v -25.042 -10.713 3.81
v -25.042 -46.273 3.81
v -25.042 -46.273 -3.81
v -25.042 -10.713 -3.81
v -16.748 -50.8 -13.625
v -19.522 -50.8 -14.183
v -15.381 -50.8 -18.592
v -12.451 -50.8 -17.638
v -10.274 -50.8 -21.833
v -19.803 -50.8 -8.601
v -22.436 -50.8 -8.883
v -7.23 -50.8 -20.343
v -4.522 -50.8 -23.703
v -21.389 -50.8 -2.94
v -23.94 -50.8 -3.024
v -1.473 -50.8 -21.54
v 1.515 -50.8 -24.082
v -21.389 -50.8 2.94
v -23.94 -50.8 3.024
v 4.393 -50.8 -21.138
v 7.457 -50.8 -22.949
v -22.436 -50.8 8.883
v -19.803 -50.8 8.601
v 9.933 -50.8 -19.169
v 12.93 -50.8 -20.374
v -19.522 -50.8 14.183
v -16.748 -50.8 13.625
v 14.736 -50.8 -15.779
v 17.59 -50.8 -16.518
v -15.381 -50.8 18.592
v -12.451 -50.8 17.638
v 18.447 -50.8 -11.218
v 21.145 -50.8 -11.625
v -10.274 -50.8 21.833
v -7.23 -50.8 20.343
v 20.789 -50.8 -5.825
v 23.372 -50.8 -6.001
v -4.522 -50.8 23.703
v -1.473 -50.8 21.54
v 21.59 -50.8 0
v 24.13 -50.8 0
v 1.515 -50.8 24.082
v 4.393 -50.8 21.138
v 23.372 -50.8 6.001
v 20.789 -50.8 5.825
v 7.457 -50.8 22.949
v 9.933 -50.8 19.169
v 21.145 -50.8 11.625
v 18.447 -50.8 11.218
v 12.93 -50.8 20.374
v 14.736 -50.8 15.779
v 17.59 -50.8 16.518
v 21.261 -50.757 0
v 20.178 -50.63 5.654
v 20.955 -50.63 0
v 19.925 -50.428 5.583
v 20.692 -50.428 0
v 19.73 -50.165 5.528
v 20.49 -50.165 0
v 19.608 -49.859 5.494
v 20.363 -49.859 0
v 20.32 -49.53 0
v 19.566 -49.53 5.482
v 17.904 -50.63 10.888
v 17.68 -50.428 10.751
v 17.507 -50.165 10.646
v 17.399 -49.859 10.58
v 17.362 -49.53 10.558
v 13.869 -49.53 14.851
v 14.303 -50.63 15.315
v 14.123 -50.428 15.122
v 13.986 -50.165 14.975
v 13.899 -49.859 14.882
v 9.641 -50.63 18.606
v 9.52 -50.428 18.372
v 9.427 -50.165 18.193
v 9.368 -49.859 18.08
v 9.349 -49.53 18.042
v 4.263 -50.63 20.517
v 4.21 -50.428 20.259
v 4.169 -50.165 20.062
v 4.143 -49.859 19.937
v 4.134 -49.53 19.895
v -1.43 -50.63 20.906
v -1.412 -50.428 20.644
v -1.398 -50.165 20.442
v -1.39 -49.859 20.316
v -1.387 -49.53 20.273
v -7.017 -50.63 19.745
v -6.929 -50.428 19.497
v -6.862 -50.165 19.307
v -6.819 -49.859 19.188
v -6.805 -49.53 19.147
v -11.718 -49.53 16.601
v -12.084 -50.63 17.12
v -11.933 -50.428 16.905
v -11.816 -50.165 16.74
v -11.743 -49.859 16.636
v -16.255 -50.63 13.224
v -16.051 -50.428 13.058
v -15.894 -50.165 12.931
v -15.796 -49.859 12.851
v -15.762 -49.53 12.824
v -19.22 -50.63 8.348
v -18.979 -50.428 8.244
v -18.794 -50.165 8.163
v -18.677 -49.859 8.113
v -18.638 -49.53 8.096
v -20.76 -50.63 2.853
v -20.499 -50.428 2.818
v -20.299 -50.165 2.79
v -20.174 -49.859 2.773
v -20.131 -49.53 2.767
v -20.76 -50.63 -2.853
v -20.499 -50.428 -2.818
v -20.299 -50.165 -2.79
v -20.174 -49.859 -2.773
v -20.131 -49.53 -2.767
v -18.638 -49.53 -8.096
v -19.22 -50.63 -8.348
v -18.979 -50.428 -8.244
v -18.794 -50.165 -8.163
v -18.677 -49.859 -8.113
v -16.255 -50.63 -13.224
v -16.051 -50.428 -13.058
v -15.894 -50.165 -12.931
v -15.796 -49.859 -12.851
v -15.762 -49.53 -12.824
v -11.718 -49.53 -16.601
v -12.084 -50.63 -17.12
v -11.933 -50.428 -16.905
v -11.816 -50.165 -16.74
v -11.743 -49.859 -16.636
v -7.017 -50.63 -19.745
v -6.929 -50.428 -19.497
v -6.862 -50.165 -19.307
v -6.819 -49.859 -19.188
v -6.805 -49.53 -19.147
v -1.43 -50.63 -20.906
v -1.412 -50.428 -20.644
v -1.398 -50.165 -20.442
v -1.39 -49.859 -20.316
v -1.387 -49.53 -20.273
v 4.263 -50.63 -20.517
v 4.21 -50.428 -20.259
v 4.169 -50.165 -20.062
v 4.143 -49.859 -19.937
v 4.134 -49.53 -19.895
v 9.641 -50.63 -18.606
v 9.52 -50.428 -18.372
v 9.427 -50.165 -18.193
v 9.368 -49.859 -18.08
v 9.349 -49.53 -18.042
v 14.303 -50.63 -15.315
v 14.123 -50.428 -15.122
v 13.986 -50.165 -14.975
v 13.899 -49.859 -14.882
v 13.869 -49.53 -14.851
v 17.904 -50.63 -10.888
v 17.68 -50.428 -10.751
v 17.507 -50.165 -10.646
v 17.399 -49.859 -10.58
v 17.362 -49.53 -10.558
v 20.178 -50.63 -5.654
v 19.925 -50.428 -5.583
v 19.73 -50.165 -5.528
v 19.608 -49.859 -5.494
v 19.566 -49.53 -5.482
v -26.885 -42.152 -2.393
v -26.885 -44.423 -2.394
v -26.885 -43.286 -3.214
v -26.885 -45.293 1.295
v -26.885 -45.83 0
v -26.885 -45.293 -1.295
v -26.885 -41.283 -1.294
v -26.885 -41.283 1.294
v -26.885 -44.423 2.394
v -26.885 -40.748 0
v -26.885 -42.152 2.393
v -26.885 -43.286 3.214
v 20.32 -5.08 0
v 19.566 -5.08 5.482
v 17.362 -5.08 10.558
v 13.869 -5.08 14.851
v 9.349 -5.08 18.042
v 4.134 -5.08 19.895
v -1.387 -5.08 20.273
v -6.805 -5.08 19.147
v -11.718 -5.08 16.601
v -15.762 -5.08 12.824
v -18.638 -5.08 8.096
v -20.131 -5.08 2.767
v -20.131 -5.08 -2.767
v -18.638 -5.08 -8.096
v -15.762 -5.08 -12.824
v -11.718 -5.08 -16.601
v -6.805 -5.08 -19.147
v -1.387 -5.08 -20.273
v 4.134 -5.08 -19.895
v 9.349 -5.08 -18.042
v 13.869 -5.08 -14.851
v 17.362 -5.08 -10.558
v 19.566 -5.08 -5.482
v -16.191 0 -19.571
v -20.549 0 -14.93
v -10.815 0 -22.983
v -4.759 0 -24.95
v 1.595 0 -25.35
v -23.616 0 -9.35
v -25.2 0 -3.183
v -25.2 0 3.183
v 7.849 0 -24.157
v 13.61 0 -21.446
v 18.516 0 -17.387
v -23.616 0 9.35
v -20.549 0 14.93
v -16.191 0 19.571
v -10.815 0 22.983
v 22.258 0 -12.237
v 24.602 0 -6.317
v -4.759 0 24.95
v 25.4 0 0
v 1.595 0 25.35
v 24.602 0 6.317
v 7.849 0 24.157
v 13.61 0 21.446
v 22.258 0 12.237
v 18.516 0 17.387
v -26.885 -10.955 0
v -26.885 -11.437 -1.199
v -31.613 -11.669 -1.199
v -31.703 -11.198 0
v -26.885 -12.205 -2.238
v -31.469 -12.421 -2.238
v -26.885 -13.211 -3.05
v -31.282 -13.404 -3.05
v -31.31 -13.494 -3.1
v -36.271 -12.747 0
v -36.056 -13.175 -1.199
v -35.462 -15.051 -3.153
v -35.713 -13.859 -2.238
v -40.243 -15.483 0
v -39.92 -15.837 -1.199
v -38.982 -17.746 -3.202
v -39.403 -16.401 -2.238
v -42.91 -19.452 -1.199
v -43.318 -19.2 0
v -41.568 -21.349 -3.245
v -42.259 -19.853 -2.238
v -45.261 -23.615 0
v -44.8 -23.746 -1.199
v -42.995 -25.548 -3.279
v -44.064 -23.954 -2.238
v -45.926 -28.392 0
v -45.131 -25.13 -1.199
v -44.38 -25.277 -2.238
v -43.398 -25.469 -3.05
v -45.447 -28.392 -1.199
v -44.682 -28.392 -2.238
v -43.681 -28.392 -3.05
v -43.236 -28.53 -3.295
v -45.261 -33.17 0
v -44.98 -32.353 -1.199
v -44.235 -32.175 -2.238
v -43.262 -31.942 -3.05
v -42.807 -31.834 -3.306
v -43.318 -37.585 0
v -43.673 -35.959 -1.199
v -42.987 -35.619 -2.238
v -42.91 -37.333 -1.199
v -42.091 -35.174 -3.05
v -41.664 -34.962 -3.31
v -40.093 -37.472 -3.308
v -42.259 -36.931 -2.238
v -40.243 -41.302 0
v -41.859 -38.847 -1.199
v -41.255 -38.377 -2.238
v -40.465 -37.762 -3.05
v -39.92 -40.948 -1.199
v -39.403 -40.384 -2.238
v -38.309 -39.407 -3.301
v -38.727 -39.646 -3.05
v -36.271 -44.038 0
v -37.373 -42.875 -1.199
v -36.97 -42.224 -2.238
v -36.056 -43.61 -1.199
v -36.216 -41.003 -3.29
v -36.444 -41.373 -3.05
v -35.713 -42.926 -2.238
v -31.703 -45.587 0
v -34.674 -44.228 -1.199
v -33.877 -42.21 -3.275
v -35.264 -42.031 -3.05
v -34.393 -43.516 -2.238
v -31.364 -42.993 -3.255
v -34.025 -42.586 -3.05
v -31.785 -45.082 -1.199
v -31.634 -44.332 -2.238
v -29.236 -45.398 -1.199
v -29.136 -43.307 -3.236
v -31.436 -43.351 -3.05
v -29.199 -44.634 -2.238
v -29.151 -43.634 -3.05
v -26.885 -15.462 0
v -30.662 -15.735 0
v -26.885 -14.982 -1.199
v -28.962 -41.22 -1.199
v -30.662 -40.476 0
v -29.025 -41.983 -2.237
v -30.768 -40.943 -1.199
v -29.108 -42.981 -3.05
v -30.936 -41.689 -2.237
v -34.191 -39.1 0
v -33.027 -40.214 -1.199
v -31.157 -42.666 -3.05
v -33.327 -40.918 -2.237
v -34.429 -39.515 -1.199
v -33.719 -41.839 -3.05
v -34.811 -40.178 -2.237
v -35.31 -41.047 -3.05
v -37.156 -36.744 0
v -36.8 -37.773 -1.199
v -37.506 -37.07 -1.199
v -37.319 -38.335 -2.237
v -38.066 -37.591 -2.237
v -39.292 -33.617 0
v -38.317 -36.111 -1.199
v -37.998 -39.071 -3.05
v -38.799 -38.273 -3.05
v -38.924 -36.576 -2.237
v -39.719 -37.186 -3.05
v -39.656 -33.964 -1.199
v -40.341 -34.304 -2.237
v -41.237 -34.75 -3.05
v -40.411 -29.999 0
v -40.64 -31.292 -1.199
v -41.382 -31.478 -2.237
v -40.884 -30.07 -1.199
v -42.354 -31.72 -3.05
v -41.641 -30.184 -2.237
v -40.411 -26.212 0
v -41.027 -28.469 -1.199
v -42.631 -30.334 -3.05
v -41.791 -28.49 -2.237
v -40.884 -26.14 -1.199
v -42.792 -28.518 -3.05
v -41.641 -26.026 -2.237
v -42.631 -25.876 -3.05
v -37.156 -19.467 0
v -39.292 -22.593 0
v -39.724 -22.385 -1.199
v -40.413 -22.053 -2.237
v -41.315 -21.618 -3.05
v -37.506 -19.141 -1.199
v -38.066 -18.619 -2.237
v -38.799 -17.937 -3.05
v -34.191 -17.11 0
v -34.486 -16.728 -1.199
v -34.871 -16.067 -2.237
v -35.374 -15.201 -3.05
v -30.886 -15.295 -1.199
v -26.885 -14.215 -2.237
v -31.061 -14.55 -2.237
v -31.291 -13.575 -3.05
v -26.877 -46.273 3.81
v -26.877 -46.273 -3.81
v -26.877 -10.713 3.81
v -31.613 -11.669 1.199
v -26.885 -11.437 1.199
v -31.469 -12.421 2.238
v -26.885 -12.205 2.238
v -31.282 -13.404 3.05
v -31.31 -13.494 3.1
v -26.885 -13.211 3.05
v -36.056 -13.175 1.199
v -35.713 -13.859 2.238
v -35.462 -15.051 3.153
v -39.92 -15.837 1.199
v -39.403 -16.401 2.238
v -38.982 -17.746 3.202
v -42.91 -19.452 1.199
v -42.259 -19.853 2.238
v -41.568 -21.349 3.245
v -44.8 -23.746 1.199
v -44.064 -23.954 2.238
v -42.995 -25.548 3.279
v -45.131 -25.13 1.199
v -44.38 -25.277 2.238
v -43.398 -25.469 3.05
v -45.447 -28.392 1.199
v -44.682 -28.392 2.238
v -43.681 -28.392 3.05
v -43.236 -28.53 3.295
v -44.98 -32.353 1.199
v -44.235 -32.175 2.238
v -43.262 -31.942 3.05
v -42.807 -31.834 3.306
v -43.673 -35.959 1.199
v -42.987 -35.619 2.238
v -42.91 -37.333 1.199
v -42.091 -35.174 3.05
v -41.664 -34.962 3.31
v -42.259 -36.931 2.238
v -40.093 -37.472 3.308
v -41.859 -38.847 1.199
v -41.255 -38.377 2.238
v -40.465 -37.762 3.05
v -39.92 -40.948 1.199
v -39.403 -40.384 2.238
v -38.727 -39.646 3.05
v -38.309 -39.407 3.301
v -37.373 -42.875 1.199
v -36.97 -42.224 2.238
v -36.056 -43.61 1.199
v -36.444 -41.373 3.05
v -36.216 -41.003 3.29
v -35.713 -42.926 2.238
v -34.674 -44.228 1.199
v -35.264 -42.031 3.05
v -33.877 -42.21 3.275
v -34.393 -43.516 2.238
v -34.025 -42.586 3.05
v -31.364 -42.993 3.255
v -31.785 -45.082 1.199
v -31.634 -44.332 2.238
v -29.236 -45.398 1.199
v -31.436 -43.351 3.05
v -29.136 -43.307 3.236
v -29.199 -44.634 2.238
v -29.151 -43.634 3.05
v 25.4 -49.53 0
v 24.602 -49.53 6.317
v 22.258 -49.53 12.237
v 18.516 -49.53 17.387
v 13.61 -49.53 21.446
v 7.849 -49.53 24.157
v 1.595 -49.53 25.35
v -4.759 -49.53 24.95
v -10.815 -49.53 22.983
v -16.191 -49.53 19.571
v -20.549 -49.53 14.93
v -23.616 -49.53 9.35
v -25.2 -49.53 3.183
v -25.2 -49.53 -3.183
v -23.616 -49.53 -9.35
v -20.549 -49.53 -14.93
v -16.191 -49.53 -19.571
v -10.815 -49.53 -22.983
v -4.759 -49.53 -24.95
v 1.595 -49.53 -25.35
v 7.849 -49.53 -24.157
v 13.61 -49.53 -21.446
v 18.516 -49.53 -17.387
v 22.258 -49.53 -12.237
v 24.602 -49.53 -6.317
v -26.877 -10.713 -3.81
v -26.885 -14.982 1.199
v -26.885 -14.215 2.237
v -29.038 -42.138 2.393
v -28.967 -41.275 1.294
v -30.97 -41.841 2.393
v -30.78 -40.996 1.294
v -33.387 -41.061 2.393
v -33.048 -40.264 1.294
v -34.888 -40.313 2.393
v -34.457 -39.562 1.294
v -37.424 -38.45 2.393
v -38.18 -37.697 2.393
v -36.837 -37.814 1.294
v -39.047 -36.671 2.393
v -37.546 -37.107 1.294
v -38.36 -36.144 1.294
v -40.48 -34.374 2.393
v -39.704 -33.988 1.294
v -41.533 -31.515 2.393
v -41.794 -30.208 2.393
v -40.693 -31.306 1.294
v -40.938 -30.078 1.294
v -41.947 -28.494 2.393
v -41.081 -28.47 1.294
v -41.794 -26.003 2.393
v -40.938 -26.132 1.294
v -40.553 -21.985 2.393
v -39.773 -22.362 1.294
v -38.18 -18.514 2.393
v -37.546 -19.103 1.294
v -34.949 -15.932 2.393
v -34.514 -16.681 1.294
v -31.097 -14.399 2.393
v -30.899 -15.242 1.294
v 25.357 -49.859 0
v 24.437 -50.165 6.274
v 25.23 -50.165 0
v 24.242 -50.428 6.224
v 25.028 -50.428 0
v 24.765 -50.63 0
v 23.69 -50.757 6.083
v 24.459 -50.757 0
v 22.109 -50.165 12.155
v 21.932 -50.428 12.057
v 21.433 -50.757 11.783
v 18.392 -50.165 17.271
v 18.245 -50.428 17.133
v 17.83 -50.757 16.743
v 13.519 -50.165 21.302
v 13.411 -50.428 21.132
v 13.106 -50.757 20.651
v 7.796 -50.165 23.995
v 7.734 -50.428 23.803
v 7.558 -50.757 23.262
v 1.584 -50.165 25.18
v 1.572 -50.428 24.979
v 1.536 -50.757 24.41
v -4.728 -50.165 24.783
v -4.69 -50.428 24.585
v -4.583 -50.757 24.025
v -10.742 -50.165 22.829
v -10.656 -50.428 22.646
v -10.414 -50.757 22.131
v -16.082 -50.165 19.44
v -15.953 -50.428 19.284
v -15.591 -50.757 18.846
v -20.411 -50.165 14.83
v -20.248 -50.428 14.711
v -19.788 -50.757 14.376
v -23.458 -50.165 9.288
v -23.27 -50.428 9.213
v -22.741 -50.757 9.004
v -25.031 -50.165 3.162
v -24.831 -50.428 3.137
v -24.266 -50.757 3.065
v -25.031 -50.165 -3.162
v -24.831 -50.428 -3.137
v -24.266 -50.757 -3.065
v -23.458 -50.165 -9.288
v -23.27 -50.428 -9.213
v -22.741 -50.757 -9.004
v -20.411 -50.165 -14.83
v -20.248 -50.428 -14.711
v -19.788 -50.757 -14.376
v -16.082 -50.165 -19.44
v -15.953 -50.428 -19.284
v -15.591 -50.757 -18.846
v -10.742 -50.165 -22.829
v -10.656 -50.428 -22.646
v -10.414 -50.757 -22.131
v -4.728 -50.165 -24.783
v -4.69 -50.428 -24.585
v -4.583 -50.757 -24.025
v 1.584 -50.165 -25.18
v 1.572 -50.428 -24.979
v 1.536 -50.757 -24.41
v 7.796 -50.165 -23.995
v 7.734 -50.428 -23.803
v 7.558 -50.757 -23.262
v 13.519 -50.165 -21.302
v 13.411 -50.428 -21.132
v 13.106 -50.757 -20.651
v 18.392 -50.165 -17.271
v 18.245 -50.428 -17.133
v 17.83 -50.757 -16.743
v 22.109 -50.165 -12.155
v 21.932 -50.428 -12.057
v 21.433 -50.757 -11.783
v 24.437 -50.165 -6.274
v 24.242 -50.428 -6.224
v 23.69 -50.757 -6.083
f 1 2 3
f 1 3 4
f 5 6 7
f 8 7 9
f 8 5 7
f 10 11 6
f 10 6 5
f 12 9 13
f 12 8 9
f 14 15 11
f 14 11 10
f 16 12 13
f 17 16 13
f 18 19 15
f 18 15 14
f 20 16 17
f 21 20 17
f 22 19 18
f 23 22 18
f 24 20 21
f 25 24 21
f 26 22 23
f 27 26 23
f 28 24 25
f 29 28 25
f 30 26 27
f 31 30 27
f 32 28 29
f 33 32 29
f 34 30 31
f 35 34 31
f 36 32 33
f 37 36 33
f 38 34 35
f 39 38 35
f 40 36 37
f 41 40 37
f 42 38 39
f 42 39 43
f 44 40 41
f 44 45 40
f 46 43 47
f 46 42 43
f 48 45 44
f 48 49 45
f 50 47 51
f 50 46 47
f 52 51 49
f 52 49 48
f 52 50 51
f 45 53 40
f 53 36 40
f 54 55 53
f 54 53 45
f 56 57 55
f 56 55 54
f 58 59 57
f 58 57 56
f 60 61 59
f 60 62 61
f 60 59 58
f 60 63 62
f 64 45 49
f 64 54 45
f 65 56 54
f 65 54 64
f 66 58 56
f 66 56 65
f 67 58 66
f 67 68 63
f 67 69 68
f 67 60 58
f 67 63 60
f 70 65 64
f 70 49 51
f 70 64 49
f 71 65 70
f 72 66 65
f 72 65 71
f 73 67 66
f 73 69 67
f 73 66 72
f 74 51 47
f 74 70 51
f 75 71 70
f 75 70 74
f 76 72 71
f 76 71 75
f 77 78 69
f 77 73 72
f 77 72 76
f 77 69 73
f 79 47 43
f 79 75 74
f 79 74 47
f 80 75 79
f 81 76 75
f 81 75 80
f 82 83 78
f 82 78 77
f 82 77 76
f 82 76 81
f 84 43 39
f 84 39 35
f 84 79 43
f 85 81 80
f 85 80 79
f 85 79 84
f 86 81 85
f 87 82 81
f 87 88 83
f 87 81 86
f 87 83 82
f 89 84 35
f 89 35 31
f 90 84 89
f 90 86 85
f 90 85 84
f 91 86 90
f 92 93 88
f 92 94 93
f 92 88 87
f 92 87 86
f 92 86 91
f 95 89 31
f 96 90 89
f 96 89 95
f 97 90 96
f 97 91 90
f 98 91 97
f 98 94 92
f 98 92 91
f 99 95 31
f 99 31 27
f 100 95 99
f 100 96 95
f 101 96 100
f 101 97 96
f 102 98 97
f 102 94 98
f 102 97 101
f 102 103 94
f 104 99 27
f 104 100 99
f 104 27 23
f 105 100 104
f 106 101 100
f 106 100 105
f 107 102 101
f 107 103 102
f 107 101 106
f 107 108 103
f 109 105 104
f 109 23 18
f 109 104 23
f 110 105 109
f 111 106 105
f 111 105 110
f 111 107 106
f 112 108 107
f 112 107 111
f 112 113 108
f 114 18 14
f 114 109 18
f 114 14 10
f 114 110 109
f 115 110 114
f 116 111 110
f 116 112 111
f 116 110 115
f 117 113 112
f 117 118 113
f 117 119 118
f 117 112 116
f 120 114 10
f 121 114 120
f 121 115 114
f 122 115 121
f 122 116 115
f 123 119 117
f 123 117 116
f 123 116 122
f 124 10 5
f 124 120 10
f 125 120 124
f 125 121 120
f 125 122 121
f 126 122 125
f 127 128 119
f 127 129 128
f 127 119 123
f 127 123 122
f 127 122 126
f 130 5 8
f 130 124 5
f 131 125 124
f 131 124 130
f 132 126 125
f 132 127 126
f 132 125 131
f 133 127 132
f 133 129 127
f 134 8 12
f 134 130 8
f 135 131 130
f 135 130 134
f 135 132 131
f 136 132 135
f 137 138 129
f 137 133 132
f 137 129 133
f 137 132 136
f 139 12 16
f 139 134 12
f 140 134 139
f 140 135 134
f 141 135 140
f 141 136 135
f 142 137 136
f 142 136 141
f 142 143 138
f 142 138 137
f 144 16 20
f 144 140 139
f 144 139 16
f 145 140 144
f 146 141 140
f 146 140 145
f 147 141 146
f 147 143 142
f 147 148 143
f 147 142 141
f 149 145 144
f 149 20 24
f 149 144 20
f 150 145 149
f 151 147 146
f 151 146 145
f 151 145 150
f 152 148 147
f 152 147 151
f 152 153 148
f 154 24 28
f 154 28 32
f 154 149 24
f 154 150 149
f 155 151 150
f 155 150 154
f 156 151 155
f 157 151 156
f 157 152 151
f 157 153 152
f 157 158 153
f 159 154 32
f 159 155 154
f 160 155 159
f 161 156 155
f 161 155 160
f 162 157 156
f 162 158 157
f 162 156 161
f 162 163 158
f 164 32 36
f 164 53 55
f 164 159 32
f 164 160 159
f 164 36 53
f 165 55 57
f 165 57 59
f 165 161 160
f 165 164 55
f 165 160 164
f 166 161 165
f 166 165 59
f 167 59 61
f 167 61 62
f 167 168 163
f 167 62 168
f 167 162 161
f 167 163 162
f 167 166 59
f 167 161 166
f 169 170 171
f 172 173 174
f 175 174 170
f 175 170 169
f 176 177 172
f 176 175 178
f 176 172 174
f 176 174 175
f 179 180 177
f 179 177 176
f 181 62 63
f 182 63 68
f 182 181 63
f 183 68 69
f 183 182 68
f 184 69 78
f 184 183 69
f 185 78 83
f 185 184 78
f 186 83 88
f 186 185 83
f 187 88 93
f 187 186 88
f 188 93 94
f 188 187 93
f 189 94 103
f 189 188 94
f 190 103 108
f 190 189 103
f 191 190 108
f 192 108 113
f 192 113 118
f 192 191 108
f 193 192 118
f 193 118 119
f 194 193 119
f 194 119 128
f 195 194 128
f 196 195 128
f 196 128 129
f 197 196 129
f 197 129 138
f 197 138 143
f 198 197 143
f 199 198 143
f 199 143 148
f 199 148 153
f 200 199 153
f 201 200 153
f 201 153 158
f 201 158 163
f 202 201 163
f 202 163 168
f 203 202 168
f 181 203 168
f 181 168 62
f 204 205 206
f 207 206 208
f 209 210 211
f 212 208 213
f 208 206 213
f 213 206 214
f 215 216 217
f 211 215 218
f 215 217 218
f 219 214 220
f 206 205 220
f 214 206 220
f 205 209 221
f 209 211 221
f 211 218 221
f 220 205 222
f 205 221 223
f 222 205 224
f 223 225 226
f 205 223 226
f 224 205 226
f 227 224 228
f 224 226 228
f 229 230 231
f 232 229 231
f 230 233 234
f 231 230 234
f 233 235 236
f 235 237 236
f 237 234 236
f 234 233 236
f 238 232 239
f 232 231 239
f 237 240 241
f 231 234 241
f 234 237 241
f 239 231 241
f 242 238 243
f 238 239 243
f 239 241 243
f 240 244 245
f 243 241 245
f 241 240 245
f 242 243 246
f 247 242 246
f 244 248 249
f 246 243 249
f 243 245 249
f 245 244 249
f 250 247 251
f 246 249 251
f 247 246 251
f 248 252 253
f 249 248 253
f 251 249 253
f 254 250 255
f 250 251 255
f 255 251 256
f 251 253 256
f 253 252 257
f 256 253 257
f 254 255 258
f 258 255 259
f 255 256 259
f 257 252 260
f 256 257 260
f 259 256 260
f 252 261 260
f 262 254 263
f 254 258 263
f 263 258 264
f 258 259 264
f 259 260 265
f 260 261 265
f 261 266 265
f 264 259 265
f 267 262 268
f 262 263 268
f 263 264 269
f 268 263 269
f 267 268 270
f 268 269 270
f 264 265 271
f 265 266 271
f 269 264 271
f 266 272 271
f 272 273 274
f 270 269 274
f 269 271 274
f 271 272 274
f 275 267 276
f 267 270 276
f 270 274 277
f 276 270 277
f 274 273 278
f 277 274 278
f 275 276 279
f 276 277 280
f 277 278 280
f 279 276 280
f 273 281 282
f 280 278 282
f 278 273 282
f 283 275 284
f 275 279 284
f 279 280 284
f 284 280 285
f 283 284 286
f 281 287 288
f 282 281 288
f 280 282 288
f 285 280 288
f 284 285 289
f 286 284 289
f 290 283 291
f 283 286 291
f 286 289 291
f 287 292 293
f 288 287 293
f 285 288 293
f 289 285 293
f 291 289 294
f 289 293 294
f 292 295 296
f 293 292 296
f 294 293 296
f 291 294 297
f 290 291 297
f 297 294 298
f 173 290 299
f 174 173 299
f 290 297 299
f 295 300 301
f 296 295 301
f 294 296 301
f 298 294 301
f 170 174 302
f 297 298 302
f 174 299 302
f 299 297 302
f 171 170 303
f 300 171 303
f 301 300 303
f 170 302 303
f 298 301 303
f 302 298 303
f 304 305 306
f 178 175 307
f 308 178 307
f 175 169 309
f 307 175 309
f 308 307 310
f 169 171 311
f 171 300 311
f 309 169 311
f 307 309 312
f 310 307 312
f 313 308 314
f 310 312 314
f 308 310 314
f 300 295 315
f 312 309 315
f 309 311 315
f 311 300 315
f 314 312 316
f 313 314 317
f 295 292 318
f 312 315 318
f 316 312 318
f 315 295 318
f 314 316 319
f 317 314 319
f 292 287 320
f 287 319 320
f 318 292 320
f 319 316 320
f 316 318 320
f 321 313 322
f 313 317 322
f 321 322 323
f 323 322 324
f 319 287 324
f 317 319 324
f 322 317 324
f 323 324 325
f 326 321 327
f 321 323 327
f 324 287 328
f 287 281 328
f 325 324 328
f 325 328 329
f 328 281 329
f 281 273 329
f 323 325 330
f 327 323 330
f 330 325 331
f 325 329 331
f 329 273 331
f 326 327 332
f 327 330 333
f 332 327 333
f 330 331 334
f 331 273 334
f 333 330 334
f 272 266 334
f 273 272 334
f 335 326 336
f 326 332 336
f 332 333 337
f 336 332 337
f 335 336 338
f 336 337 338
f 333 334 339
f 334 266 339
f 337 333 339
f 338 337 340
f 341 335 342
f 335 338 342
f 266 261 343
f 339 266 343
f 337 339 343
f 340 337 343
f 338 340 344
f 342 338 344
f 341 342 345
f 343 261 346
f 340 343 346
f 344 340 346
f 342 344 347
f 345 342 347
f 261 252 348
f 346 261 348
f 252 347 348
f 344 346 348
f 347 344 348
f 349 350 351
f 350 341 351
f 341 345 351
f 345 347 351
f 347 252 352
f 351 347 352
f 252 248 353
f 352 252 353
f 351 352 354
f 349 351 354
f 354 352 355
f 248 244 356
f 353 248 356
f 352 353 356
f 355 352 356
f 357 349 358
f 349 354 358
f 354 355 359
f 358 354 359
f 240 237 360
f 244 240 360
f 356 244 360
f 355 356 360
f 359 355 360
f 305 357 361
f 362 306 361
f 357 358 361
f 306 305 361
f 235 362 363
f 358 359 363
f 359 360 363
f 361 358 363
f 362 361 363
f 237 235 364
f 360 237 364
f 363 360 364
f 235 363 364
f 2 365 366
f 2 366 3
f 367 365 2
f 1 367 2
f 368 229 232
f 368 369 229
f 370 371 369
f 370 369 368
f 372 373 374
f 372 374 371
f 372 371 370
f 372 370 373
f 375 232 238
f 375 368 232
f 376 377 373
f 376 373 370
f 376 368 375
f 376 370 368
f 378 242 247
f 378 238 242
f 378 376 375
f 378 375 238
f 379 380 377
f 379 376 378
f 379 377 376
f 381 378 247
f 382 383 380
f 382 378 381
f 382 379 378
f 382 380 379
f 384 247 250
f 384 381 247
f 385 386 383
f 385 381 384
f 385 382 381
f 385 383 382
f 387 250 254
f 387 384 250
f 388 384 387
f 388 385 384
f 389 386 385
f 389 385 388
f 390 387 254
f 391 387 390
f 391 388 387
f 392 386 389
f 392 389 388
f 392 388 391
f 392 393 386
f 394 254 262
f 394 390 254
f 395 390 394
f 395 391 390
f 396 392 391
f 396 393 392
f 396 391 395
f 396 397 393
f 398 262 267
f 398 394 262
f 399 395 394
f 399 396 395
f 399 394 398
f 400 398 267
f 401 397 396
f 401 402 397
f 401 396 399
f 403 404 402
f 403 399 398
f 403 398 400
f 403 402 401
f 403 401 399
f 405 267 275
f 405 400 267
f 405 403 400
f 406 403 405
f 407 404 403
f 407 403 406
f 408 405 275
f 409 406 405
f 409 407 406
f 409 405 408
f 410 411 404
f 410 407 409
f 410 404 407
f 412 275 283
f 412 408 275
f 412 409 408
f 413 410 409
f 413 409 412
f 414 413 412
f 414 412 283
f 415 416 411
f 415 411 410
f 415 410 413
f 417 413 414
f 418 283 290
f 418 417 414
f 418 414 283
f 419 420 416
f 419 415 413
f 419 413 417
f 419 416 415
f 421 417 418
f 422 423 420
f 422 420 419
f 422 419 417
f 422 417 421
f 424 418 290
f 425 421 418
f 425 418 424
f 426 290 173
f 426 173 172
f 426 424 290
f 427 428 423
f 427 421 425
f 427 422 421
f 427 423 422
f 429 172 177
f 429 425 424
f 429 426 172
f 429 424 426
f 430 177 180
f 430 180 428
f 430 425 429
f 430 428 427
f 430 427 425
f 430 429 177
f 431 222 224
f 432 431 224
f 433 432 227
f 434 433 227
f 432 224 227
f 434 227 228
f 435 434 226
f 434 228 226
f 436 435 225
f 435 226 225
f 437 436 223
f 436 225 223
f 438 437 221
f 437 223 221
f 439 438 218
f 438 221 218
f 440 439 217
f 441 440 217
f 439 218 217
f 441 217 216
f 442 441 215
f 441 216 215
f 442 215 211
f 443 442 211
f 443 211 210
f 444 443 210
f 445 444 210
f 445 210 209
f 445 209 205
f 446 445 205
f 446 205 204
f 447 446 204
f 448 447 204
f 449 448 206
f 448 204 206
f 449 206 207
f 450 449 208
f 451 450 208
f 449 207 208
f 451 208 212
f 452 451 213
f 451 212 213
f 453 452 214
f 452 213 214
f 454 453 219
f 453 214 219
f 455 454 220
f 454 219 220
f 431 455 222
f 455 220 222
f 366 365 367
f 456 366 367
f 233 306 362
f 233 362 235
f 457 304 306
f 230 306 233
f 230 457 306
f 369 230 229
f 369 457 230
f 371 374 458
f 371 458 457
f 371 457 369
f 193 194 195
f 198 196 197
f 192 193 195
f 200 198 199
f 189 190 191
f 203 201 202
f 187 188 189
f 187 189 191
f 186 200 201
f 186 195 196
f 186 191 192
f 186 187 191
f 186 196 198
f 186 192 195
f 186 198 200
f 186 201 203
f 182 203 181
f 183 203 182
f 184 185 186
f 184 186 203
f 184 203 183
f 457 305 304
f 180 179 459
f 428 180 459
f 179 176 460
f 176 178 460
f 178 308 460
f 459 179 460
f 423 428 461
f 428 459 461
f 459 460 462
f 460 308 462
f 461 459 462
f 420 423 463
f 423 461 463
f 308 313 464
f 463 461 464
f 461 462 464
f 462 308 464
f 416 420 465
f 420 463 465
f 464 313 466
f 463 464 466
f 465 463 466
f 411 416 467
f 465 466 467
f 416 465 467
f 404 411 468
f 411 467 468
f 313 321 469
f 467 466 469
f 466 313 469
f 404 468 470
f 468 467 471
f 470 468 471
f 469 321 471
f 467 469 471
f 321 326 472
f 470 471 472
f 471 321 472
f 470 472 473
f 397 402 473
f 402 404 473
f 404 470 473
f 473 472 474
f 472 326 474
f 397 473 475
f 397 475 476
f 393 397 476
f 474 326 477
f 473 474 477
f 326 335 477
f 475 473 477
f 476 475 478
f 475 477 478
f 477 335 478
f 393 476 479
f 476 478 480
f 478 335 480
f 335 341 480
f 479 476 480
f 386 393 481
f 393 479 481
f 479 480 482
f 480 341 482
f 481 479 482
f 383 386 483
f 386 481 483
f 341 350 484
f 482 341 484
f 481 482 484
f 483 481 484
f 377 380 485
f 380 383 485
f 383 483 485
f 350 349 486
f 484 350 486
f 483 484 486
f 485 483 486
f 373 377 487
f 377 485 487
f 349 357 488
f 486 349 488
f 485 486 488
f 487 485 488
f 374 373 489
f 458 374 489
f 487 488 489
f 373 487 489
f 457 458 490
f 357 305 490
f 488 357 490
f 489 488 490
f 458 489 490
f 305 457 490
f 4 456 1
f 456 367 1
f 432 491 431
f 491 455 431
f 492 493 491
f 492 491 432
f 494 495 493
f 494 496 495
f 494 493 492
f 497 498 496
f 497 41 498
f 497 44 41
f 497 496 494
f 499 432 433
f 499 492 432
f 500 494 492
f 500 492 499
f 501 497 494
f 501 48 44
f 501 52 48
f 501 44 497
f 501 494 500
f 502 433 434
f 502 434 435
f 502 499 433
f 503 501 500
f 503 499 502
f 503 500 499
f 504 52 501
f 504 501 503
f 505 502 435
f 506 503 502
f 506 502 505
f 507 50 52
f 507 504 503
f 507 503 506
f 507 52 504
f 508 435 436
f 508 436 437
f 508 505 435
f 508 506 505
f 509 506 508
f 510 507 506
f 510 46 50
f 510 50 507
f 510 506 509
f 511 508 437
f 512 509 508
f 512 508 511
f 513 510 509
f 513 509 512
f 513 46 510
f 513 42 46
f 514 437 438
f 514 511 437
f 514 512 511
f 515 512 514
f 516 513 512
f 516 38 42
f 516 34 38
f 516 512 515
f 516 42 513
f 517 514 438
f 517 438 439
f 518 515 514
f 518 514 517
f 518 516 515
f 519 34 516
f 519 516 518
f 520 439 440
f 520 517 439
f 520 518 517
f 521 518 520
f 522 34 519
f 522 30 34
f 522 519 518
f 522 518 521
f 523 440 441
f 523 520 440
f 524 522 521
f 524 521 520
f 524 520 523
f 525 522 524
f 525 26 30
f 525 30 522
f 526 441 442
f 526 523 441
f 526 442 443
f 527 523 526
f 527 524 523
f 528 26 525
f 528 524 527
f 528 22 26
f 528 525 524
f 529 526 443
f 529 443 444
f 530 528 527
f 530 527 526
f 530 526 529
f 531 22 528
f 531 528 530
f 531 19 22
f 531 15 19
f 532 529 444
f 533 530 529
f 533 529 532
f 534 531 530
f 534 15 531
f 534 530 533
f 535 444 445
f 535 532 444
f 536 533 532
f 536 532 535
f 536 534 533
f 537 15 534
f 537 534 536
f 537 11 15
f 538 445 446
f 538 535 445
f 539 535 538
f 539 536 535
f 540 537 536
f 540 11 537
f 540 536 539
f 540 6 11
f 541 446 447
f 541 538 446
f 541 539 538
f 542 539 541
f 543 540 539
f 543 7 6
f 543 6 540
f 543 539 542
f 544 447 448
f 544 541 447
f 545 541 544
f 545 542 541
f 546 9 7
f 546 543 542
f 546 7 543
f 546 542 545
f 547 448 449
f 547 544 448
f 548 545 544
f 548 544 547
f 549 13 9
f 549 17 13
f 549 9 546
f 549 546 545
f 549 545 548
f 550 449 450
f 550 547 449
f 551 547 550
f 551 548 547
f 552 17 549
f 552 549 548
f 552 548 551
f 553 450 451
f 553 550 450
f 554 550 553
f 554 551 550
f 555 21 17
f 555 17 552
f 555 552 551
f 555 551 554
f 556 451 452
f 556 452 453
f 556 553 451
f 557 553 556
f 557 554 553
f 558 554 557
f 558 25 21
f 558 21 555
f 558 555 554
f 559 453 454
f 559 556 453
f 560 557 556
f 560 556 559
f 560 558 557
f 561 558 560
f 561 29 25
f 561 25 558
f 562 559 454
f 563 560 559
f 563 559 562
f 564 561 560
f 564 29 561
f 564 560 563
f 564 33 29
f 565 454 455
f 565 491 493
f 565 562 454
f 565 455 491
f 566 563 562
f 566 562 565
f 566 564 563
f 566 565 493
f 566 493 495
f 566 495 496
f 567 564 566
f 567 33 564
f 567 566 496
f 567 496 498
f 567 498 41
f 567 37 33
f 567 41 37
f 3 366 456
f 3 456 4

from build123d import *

# Parameters (mm, degrees)
F0_R        = 25.4
F1_DEPTH    = 50.8
F2_T        = -5.08
F3_R        = 1.27
F5_DEPTH    = 3.81
F6_W        = 1.8350626505
F6_H        = 35.56
F7_DEPTH    = 3.81
F8_T2_ANGLE = 305.4756287564
F8_T4_ANGLE = 305.4756287564
F8_T6_ANGLE = 272.5058510715
F8_T8_ANGLE = 272.5058510715


# Not quite as in the source:
# - a fillet or chamfer that OpenCascade refuses, or shapes differently, is made with other operations: its cross-section is extruded or revolved along the edge and cut away or added


with BuildPart() as f1:
    # F0 (on Front) → F1 (new body)
    with BuildSketch(Plane.XZ):
        Circle(F0_R)
    extrude(amount=F1_DEPTH)

    # F2
    f2_openings = [f1.faces().sort_by_distance(p)[0] for p in [
        (0, -50.8, 0),
    ]]
    offset(amount=F2_T, openings=f2_openings)

    # F3
    f3_edges = [f1.edges().sort_by_distance(p)[0] for p in [
        (-25.4, -50.8, 0),
        (-20.32, -50.8, 0),
    ]]
    fillet(f3_edges, radius=F3_R)


with BuildPart() as f5:
    # F4 (on Top) → F5 (new body, symmetric)
    with BuildSketch(Plane.XY):
        with BuildLine():
            ThreePointArc((-26.8851481378, -40.5866503716), (-40.3914383995, -28.1052119099), (-26.8851481378, -15.6237734482))
            Line((-26.8851481378, -15.6237734482), (-26.8851481378, -10.7935341075))
            ThreePointArc((-26.8851481378, -10.7935341075), (-46.0874012872, -28.3924848773), (-26.8851481378, -45.991435647))
            Line((-26.8851481378, -45.991435647), (-26.8851481378, -40.5866503716))
        make_face()
    extrude(amount=F5_DEPTH, both=True)

    # F8: fillet of radius 5.08 on 4 edges, made by hand

    # F8_s1 → F8_t2 (revolve, cut)
    with BuildSketch(Plane(origin=(-17.2918796722, -33.5567244349, 0), x_dir=(0, 0, 1), z_dir=(0.4580629802, 0.8889197411, 0))):
        with BuildLine():
            ThreePointArc((1.27, 0.61909191), (-2.3221024484, 2.1069894616), (-3.81, 5.69909191))
            Line((-3.81, 5.69909191), (-3.81, 0.61909191))
            Line((-3.81, 0.61909191), (1.27, 0.61909191))
        make_face()
    revolve(axis=Axis((-27.8711172694, -28.1052119099, -3.81), (0, 0, -1)), revolution_arc=F8_T2_ANGLE, mode=Mode.SUBTRACT)

    # F8_s3 → F8_t4 (revolve, cut)
    with BuildSketch(Plane(origin=(-17.2918796722, -33.5567244349, 0), x_dir=(0, 0, 1), z_dir=(0.4580629802, 0.8889197411, 0))):
        with BuildLine():
            ThreePointArc((3.81, 5.69909191), (2.3221024484, 2.1069894616), (-1.27, 0.61909191))
            Line((-1.27, 0.61909191), (3.81, 0.61909191))
            Line((3.81, 0.61909191), (3.81, 5.69909191))
        make_face()
    revolve(axis=Axis((-27.8711172694, -28.1052119099, 3.81), (0, 0, -1)), revolution_arc=F8_T4_ANGLE, mode=Mode.SUBTRACT)

    # F8_s5 → F8_t6 (revolve, cut)
    with BuildSketch(Plane(origin=(0.5932237272, -0.6197529366, 0), x_dir=(0, 0, 1), z_dir=(0.6914761708, -0.7223992699, 0))):
        with BuildLine():
            ThreePointArc((1.27, 22.498524229), (-2.3221024484, 23.9864217805), (-3.81, 27.578524229))
            Line((-3.81, 27.578524229), (-3.81, 22.498524229))
            Line((-3.81, 22.498524229), (1.27, 22.498524229))
        make_face()
    revolve(axis=Axis((-28.4215162233, -28.3924848773, -3.81), (0, 0, 1)), revolution_arc=F8_T6_ANGLE, mode=Mode.SUBTRACT)

    # F8_s7 → F8_t8 (revolve, cut)
    with BuildSketch(Plane(origin=(0.5932237272, -0.6197529366, 0), x_dir=(0, 0, 1), z_dir=(0.6914761708, -0.7223992699, 0))):
        with BuildLine():
            ThreePointArc((-1.27, 22.498524229), (2.3221024484, 23.9864217805), (3.81, 27.578524229))
            Line((3.81, 27.578524229), (3.81, 22.498524229))
            Line((3.81, 22.498524229), (-1.27, 22.498524229))
        make_face()
    revolve(axis=Axis((-28.4215162233, -28.3924848773, 3.81), (0, 0, 1)), revolution_arc=F8_T8_ANGLE, mode=Mode.SUBTRACT)


with BuildPart() as f7:
    # F6 (on Top) → F7 (new body, symmetric)
    with BuildSketch(Plane.XY):
        with Locations((-25.9598139673, -28.4927496687)):
            Rectangle(F6_W, F6_H)
    extrude(amount=F7_DEPTH, both=True)


solid = Compound([f1.part, f5.part, f7.part])
